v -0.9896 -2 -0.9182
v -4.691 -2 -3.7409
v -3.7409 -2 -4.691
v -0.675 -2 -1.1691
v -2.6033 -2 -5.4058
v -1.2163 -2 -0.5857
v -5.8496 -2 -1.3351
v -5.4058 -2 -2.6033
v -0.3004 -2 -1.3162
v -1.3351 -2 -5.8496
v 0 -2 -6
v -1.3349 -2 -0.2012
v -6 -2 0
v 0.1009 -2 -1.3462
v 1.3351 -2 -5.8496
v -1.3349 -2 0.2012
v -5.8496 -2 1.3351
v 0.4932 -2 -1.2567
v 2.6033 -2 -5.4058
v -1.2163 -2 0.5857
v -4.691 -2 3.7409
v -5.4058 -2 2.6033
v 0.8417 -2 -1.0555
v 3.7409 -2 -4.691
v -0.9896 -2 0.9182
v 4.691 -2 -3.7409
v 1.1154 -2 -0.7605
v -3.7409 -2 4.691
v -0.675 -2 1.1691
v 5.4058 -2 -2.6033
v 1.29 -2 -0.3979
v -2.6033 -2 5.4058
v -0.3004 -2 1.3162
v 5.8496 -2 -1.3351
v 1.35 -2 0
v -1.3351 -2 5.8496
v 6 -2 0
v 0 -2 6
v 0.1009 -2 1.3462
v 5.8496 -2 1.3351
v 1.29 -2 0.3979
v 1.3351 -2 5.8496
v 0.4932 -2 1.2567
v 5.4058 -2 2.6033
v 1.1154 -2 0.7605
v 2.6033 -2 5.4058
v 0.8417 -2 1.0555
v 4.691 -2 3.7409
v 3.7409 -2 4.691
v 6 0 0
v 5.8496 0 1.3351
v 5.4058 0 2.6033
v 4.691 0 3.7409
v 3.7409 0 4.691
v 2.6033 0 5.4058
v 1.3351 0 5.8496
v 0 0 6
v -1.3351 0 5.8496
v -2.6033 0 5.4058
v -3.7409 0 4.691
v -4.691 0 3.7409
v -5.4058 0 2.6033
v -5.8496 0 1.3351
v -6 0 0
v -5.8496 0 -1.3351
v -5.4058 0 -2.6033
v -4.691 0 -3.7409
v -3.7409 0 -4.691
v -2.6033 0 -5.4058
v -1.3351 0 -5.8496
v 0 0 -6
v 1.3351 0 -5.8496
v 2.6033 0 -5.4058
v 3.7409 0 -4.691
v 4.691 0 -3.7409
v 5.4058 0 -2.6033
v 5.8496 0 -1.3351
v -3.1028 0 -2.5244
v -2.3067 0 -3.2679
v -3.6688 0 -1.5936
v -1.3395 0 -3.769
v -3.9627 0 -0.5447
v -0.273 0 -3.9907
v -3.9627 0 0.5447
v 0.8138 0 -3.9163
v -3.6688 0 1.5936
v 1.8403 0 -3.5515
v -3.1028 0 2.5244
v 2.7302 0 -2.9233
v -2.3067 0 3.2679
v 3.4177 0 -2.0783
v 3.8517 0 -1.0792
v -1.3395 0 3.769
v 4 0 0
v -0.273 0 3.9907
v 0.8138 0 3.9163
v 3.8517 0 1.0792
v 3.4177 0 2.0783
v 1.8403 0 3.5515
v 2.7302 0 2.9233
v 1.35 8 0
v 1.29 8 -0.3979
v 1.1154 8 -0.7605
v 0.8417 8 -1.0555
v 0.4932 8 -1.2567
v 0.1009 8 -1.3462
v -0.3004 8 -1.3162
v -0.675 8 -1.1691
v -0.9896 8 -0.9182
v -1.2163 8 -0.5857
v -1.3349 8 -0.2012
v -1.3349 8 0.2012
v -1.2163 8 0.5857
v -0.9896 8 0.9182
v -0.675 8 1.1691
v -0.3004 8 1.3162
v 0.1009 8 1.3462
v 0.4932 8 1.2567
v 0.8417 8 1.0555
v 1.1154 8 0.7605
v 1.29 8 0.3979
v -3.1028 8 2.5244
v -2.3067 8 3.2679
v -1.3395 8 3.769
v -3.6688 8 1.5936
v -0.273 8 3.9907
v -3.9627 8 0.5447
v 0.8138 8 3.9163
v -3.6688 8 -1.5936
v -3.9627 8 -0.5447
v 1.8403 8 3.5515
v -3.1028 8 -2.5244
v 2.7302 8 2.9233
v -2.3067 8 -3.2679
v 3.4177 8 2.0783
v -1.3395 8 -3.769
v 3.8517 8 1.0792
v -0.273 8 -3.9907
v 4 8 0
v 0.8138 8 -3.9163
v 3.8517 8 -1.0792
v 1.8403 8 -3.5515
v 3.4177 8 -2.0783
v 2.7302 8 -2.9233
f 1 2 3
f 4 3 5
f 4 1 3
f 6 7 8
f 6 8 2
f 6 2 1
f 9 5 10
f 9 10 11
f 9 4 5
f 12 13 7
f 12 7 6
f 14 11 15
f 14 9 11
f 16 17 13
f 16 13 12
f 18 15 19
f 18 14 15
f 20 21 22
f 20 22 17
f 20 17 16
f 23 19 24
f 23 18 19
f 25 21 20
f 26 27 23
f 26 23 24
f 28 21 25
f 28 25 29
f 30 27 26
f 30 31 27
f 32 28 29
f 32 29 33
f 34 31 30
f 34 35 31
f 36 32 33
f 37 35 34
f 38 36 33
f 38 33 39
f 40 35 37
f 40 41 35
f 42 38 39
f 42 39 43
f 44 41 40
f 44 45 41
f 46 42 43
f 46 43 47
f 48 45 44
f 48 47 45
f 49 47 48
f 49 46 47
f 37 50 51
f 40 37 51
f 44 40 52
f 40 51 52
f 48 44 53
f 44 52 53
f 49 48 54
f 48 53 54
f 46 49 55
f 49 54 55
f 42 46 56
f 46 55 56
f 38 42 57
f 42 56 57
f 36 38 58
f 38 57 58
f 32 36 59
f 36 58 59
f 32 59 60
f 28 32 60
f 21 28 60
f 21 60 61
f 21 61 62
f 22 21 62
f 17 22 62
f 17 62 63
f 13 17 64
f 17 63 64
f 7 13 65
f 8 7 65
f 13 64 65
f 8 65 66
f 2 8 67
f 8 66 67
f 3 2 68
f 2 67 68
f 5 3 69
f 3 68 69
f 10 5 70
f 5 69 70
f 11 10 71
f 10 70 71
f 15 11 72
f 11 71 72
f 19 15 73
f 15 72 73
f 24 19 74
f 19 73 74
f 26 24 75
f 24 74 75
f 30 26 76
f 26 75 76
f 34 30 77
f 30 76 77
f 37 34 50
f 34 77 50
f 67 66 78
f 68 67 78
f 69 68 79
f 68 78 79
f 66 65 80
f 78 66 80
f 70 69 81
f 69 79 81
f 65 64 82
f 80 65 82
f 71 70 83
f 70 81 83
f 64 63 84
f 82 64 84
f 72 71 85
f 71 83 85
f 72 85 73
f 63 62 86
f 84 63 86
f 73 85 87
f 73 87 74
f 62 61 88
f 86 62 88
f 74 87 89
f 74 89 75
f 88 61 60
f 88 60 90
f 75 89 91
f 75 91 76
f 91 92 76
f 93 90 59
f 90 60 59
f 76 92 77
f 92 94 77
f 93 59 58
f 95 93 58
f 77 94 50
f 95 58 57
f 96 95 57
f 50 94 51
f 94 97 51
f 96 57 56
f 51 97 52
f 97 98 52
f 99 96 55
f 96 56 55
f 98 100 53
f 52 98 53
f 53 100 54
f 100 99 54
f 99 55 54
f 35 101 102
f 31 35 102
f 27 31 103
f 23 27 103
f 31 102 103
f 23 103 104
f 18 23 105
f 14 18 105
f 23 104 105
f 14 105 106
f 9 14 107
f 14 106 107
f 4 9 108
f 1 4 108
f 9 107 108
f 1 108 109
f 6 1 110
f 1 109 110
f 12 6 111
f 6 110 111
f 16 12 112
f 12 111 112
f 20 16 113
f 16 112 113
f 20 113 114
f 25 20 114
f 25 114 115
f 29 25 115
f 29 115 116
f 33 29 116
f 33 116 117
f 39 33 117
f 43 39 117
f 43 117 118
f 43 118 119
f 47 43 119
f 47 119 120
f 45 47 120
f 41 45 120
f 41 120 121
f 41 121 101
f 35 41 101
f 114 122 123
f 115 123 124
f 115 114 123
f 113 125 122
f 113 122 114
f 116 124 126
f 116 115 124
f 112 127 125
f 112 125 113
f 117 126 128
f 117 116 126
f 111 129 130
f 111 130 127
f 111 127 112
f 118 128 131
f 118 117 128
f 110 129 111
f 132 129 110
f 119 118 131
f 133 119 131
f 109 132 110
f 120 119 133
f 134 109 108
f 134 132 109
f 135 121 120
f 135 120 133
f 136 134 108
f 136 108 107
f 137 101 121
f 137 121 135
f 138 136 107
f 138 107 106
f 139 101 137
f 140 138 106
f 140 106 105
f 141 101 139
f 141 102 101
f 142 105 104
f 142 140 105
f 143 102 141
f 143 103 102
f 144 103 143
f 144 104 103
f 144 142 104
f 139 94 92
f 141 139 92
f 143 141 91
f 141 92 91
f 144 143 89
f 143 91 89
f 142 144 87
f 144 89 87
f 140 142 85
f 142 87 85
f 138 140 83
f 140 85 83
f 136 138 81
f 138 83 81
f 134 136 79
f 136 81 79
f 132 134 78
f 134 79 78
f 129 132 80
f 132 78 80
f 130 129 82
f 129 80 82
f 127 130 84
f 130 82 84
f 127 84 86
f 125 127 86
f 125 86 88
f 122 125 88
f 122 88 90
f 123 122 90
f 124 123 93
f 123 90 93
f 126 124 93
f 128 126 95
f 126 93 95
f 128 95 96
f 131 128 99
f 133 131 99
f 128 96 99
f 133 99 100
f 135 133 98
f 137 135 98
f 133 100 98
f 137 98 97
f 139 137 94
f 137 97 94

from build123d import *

# Parameters (mm, degrees)
SKETCH_1_R          = 4
EXTRUDE_1_DEPTH     = 8
SKETCH_3_R          = 6
EXTRUDE_2_DEPTH     = 2
SKETCH_2_R          = 1.35
CUT_EXTRUDE_1_DEPTH = 12


with BuildPart() as part:
    # 스케치1 → 보스-돌출1 (new body)
    with BuildSketch(Plane(origin=(0, 0, 0), x_dir=(1, 0, 0), z_dir=(0, 1, 0))):
        Circle(SKETCH_1_R)
    extrude(amount=EXTRUDE_1_DEPTH)

    # 스케치3 → 보스-돌출2 (add)
    with BuildSketch(Plane.XZ):
        Circle(SKETCH_3_R)
    extrude(amount=EXTRUDE_2_DEPTH)

    # 스케치2 → 컷-돌출1 (cut)
    with BuildSketch(Plane(origin=(0, 8, 0), x_dir=(1, 0, 0), z_dir=(0, 1, 0))):
        Circle(SKETCH_2_R)
    extrude(amount=-CUT_EXTRUDE_1_DEPTH, mode=Mode.SUBTRACT)


solid = part.part
